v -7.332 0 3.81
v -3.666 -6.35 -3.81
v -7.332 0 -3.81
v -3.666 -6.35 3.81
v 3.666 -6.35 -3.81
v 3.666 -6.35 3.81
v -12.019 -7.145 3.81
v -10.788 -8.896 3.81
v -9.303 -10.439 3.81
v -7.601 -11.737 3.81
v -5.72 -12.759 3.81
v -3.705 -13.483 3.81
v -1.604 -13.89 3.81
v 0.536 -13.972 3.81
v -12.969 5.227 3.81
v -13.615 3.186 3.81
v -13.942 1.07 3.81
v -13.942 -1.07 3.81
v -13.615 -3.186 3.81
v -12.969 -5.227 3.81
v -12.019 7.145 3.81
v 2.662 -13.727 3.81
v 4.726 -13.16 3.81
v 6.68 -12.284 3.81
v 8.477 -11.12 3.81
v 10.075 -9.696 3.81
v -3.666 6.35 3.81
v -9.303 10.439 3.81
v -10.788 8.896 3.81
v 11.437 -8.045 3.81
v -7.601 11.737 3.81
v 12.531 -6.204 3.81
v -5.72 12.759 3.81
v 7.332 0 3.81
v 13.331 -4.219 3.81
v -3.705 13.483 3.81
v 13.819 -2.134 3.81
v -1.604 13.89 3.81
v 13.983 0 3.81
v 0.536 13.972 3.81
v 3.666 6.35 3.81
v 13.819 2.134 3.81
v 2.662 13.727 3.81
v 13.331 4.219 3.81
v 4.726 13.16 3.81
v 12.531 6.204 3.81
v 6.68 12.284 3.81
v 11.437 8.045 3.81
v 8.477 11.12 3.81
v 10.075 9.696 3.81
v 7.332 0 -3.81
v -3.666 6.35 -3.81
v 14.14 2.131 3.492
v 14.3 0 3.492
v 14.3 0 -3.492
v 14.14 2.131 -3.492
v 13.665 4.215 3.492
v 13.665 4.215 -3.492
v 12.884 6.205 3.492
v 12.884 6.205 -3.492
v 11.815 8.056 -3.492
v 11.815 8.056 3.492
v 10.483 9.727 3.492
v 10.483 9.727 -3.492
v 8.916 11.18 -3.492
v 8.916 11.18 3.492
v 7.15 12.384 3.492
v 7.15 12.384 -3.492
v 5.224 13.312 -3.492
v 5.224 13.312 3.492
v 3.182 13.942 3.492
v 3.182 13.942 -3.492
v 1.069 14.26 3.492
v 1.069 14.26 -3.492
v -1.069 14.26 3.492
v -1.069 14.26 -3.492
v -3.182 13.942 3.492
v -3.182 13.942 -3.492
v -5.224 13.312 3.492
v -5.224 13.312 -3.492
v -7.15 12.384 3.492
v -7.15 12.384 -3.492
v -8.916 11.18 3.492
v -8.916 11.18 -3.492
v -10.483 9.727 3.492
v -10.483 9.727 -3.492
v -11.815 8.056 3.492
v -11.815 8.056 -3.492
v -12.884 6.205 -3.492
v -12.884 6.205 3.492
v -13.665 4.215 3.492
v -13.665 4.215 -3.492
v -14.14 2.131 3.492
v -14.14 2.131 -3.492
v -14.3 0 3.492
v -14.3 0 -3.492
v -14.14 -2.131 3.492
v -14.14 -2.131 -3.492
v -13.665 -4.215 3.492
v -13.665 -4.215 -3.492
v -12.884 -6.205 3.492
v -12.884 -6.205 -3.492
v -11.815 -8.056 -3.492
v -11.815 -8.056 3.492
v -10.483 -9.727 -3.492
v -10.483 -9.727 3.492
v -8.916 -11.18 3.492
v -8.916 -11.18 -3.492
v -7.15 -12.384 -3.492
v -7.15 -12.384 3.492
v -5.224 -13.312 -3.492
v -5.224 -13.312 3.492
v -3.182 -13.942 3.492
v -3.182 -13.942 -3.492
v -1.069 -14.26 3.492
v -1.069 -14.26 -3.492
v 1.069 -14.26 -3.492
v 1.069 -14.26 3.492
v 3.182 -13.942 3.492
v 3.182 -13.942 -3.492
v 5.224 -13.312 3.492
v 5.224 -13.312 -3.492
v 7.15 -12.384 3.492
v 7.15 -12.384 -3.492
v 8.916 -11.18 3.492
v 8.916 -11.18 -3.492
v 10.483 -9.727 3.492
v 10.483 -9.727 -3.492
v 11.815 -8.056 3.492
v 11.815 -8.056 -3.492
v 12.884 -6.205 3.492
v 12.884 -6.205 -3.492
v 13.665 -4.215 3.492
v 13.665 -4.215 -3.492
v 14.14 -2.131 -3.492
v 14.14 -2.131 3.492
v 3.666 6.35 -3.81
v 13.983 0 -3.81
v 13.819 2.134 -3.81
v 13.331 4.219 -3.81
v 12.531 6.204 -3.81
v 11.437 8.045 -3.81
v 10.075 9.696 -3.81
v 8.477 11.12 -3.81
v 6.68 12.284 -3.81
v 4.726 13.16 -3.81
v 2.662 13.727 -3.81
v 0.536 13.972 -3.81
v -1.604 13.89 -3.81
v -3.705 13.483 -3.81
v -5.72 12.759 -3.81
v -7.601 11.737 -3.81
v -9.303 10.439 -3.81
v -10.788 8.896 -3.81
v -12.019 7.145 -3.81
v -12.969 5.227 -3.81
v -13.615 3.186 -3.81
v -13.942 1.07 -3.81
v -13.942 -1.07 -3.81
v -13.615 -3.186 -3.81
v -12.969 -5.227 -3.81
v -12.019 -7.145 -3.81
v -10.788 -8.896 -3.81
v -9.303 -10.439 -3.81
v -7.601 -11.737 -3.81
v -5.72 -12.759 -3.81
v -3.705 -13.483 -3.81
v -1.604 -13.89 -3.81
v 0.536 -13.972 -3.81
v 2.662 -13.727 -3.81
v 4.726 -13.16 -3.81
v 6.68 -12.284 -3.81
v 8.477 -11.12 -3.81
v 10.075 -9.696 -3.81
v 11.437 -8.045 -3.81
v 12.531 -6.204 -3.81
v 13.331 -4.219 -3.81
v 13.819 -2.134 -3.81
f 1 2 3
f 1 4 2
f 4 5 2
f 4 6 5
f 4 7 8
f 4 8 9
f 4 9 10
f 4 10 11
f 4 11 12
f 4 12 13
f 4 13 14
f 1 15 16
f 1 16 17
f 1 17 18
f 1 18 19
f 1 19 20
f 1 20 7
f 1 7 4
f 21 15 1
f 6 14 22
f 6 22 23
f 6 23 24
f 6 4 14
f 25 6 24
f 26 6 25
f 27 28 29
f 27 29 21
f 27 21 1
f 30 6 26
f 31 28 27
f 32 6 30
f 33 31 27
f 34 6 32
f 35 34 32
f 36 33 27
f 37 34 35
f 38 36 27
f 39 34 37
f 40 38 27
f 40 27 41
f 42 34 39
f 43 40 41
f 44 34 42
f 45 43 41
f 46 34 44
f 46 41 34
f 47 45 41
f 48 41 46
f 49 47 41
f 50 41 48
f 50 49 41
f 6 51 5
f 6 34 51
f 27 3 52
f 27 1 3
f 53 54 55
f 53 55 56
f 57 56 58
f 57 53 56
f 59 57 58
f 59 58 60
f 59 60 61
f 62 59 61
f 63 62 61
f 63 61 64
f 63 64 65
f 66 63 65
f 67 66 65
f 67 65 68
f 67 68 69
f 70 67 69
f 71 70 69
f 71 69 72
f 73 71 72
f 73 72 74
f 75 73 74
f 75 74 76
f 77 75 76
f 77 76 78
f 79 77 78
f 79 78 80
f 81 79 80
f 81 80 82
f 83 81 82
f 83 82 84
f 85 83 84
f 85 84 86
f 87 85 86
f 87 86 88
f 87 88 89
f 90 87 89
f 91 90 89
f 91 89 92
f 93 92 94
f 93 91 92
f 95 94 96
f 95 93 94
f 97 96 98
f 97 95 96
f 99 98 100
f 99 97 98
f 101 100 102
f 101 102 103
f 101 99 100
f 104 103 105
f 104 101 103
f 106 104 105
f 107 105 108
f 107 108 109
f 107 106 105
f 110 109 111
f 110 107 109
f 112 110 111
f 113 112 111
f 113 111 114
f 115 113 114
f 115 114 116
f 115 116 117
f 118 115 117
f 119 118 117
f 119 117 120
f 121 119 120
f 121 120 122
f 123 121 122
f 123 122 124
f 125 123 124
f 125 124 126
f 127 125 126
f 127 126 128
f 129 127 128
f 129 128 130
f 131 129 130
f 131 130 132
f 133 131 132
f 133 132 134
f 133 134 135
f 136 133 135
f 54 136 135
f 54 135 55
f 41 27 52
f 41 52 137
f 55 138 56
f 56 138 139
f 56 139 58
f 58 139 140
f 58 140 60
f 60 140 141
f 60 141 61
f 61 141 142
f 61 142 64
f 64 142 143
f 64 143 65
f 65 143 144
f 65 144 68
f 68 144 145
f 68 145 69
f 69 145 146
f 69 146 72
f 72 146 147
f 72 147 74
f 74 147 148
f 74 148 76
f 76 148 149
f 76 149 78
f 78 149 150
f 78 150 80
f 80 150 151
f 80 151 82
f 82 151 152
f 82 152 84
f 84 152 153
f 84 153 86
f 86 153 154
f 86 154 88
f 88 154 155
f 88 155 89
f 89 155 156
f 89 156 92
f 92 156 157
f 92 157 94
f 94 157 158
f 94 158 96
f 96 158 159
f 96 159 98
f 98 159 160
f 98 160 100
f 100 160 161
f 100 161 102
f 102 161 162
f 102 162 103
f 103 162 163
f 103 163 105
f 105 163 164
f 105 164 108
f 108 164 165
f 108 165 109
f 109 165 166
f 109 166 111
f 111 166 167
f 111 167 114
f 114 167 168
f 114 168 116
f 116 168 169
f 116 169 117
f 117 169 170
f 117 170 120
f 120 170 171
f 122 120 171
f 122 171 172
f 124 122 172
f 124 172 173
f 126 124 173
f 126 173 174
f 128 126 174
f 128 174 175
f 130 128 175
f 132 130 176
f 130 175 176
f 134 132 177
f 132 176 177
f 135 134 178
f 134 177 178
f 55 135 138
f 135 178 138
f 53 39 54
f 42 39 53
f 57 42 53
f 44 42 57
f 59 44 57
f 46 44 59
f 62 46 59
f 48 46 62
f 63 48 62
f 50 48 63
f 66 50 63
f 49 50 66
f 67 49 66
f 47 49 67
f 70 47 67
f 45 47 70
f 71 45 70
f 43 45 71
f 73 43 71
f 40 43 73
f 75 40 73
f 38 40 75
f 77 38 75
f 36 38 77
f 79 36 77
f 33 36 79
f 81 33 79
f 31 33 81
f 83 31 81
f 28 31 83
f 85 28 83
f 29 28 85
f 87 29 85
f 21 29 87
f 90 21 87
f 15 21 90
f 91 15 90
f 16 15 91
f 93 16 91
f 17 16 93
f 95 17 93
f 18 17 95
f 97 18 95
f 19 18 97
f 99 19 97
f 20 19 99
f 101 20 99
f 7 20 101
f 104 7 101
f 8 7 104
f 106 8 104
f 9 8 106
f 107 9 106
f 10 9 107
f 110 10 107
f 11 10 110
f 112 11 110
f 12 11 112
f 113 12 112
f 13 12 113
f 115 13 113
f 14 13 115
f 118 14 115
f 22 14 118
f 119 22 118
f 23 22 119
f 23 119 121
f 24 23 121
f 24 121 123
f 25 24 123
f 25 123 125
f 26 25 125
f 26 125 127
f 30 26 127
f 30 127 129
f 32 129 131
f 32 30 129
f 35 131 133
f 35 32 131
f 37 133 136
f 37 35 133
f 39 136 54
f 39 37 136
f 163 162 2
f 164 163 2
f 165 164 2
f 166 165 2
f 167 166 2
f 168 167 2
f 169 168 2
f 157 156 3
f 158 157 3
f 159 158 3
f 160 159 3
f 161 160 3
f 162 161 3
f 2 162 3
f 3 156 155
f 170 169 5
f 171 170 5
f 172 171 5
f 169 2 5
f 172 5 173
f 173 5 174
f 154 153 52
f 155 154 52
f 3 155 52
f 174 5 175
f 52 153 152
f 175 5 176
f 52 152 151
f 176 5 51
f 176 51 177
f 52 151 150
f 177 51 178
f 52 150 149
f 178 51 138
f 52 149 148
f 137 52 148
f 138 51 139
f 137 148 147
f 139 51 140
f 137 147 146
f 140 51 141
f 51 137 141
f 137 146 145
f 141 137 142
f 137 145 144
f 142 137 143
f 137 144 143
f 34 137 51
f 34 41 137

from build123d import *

# Parameters (mm, degrees)
F0_R     = 14.3002
F1_DEPTH = 3.81
F2_SIZE  = 0.3175


with BuildPart() as f1:
    # F0 (on Top) → F1 (new body, symmetric)
    with BuildSketch(Plane.XY):
        Circle(F0_R)
        Polygon((-3.6661742094, 6.35), (3.6661742094, 6.35), (7.3323484187, 0), (3.6661742094, -6.35), (-3.6661742094, -6.35), (-7.3323484187, 0), align=None, mode=Mode.SUBTRACT)
    extrude(amount=F1_DEPTH, both=True)

    # F2
    f2_edges = [f1.edges().sort_by_distance(p)[0] for p in [
        (-14.3002, 0, 3.81),
        (-14.3002, 0, -3.81),
    ]]
    chamfer(f2_edges, length=F2_SIZE)


solid = f1.part
